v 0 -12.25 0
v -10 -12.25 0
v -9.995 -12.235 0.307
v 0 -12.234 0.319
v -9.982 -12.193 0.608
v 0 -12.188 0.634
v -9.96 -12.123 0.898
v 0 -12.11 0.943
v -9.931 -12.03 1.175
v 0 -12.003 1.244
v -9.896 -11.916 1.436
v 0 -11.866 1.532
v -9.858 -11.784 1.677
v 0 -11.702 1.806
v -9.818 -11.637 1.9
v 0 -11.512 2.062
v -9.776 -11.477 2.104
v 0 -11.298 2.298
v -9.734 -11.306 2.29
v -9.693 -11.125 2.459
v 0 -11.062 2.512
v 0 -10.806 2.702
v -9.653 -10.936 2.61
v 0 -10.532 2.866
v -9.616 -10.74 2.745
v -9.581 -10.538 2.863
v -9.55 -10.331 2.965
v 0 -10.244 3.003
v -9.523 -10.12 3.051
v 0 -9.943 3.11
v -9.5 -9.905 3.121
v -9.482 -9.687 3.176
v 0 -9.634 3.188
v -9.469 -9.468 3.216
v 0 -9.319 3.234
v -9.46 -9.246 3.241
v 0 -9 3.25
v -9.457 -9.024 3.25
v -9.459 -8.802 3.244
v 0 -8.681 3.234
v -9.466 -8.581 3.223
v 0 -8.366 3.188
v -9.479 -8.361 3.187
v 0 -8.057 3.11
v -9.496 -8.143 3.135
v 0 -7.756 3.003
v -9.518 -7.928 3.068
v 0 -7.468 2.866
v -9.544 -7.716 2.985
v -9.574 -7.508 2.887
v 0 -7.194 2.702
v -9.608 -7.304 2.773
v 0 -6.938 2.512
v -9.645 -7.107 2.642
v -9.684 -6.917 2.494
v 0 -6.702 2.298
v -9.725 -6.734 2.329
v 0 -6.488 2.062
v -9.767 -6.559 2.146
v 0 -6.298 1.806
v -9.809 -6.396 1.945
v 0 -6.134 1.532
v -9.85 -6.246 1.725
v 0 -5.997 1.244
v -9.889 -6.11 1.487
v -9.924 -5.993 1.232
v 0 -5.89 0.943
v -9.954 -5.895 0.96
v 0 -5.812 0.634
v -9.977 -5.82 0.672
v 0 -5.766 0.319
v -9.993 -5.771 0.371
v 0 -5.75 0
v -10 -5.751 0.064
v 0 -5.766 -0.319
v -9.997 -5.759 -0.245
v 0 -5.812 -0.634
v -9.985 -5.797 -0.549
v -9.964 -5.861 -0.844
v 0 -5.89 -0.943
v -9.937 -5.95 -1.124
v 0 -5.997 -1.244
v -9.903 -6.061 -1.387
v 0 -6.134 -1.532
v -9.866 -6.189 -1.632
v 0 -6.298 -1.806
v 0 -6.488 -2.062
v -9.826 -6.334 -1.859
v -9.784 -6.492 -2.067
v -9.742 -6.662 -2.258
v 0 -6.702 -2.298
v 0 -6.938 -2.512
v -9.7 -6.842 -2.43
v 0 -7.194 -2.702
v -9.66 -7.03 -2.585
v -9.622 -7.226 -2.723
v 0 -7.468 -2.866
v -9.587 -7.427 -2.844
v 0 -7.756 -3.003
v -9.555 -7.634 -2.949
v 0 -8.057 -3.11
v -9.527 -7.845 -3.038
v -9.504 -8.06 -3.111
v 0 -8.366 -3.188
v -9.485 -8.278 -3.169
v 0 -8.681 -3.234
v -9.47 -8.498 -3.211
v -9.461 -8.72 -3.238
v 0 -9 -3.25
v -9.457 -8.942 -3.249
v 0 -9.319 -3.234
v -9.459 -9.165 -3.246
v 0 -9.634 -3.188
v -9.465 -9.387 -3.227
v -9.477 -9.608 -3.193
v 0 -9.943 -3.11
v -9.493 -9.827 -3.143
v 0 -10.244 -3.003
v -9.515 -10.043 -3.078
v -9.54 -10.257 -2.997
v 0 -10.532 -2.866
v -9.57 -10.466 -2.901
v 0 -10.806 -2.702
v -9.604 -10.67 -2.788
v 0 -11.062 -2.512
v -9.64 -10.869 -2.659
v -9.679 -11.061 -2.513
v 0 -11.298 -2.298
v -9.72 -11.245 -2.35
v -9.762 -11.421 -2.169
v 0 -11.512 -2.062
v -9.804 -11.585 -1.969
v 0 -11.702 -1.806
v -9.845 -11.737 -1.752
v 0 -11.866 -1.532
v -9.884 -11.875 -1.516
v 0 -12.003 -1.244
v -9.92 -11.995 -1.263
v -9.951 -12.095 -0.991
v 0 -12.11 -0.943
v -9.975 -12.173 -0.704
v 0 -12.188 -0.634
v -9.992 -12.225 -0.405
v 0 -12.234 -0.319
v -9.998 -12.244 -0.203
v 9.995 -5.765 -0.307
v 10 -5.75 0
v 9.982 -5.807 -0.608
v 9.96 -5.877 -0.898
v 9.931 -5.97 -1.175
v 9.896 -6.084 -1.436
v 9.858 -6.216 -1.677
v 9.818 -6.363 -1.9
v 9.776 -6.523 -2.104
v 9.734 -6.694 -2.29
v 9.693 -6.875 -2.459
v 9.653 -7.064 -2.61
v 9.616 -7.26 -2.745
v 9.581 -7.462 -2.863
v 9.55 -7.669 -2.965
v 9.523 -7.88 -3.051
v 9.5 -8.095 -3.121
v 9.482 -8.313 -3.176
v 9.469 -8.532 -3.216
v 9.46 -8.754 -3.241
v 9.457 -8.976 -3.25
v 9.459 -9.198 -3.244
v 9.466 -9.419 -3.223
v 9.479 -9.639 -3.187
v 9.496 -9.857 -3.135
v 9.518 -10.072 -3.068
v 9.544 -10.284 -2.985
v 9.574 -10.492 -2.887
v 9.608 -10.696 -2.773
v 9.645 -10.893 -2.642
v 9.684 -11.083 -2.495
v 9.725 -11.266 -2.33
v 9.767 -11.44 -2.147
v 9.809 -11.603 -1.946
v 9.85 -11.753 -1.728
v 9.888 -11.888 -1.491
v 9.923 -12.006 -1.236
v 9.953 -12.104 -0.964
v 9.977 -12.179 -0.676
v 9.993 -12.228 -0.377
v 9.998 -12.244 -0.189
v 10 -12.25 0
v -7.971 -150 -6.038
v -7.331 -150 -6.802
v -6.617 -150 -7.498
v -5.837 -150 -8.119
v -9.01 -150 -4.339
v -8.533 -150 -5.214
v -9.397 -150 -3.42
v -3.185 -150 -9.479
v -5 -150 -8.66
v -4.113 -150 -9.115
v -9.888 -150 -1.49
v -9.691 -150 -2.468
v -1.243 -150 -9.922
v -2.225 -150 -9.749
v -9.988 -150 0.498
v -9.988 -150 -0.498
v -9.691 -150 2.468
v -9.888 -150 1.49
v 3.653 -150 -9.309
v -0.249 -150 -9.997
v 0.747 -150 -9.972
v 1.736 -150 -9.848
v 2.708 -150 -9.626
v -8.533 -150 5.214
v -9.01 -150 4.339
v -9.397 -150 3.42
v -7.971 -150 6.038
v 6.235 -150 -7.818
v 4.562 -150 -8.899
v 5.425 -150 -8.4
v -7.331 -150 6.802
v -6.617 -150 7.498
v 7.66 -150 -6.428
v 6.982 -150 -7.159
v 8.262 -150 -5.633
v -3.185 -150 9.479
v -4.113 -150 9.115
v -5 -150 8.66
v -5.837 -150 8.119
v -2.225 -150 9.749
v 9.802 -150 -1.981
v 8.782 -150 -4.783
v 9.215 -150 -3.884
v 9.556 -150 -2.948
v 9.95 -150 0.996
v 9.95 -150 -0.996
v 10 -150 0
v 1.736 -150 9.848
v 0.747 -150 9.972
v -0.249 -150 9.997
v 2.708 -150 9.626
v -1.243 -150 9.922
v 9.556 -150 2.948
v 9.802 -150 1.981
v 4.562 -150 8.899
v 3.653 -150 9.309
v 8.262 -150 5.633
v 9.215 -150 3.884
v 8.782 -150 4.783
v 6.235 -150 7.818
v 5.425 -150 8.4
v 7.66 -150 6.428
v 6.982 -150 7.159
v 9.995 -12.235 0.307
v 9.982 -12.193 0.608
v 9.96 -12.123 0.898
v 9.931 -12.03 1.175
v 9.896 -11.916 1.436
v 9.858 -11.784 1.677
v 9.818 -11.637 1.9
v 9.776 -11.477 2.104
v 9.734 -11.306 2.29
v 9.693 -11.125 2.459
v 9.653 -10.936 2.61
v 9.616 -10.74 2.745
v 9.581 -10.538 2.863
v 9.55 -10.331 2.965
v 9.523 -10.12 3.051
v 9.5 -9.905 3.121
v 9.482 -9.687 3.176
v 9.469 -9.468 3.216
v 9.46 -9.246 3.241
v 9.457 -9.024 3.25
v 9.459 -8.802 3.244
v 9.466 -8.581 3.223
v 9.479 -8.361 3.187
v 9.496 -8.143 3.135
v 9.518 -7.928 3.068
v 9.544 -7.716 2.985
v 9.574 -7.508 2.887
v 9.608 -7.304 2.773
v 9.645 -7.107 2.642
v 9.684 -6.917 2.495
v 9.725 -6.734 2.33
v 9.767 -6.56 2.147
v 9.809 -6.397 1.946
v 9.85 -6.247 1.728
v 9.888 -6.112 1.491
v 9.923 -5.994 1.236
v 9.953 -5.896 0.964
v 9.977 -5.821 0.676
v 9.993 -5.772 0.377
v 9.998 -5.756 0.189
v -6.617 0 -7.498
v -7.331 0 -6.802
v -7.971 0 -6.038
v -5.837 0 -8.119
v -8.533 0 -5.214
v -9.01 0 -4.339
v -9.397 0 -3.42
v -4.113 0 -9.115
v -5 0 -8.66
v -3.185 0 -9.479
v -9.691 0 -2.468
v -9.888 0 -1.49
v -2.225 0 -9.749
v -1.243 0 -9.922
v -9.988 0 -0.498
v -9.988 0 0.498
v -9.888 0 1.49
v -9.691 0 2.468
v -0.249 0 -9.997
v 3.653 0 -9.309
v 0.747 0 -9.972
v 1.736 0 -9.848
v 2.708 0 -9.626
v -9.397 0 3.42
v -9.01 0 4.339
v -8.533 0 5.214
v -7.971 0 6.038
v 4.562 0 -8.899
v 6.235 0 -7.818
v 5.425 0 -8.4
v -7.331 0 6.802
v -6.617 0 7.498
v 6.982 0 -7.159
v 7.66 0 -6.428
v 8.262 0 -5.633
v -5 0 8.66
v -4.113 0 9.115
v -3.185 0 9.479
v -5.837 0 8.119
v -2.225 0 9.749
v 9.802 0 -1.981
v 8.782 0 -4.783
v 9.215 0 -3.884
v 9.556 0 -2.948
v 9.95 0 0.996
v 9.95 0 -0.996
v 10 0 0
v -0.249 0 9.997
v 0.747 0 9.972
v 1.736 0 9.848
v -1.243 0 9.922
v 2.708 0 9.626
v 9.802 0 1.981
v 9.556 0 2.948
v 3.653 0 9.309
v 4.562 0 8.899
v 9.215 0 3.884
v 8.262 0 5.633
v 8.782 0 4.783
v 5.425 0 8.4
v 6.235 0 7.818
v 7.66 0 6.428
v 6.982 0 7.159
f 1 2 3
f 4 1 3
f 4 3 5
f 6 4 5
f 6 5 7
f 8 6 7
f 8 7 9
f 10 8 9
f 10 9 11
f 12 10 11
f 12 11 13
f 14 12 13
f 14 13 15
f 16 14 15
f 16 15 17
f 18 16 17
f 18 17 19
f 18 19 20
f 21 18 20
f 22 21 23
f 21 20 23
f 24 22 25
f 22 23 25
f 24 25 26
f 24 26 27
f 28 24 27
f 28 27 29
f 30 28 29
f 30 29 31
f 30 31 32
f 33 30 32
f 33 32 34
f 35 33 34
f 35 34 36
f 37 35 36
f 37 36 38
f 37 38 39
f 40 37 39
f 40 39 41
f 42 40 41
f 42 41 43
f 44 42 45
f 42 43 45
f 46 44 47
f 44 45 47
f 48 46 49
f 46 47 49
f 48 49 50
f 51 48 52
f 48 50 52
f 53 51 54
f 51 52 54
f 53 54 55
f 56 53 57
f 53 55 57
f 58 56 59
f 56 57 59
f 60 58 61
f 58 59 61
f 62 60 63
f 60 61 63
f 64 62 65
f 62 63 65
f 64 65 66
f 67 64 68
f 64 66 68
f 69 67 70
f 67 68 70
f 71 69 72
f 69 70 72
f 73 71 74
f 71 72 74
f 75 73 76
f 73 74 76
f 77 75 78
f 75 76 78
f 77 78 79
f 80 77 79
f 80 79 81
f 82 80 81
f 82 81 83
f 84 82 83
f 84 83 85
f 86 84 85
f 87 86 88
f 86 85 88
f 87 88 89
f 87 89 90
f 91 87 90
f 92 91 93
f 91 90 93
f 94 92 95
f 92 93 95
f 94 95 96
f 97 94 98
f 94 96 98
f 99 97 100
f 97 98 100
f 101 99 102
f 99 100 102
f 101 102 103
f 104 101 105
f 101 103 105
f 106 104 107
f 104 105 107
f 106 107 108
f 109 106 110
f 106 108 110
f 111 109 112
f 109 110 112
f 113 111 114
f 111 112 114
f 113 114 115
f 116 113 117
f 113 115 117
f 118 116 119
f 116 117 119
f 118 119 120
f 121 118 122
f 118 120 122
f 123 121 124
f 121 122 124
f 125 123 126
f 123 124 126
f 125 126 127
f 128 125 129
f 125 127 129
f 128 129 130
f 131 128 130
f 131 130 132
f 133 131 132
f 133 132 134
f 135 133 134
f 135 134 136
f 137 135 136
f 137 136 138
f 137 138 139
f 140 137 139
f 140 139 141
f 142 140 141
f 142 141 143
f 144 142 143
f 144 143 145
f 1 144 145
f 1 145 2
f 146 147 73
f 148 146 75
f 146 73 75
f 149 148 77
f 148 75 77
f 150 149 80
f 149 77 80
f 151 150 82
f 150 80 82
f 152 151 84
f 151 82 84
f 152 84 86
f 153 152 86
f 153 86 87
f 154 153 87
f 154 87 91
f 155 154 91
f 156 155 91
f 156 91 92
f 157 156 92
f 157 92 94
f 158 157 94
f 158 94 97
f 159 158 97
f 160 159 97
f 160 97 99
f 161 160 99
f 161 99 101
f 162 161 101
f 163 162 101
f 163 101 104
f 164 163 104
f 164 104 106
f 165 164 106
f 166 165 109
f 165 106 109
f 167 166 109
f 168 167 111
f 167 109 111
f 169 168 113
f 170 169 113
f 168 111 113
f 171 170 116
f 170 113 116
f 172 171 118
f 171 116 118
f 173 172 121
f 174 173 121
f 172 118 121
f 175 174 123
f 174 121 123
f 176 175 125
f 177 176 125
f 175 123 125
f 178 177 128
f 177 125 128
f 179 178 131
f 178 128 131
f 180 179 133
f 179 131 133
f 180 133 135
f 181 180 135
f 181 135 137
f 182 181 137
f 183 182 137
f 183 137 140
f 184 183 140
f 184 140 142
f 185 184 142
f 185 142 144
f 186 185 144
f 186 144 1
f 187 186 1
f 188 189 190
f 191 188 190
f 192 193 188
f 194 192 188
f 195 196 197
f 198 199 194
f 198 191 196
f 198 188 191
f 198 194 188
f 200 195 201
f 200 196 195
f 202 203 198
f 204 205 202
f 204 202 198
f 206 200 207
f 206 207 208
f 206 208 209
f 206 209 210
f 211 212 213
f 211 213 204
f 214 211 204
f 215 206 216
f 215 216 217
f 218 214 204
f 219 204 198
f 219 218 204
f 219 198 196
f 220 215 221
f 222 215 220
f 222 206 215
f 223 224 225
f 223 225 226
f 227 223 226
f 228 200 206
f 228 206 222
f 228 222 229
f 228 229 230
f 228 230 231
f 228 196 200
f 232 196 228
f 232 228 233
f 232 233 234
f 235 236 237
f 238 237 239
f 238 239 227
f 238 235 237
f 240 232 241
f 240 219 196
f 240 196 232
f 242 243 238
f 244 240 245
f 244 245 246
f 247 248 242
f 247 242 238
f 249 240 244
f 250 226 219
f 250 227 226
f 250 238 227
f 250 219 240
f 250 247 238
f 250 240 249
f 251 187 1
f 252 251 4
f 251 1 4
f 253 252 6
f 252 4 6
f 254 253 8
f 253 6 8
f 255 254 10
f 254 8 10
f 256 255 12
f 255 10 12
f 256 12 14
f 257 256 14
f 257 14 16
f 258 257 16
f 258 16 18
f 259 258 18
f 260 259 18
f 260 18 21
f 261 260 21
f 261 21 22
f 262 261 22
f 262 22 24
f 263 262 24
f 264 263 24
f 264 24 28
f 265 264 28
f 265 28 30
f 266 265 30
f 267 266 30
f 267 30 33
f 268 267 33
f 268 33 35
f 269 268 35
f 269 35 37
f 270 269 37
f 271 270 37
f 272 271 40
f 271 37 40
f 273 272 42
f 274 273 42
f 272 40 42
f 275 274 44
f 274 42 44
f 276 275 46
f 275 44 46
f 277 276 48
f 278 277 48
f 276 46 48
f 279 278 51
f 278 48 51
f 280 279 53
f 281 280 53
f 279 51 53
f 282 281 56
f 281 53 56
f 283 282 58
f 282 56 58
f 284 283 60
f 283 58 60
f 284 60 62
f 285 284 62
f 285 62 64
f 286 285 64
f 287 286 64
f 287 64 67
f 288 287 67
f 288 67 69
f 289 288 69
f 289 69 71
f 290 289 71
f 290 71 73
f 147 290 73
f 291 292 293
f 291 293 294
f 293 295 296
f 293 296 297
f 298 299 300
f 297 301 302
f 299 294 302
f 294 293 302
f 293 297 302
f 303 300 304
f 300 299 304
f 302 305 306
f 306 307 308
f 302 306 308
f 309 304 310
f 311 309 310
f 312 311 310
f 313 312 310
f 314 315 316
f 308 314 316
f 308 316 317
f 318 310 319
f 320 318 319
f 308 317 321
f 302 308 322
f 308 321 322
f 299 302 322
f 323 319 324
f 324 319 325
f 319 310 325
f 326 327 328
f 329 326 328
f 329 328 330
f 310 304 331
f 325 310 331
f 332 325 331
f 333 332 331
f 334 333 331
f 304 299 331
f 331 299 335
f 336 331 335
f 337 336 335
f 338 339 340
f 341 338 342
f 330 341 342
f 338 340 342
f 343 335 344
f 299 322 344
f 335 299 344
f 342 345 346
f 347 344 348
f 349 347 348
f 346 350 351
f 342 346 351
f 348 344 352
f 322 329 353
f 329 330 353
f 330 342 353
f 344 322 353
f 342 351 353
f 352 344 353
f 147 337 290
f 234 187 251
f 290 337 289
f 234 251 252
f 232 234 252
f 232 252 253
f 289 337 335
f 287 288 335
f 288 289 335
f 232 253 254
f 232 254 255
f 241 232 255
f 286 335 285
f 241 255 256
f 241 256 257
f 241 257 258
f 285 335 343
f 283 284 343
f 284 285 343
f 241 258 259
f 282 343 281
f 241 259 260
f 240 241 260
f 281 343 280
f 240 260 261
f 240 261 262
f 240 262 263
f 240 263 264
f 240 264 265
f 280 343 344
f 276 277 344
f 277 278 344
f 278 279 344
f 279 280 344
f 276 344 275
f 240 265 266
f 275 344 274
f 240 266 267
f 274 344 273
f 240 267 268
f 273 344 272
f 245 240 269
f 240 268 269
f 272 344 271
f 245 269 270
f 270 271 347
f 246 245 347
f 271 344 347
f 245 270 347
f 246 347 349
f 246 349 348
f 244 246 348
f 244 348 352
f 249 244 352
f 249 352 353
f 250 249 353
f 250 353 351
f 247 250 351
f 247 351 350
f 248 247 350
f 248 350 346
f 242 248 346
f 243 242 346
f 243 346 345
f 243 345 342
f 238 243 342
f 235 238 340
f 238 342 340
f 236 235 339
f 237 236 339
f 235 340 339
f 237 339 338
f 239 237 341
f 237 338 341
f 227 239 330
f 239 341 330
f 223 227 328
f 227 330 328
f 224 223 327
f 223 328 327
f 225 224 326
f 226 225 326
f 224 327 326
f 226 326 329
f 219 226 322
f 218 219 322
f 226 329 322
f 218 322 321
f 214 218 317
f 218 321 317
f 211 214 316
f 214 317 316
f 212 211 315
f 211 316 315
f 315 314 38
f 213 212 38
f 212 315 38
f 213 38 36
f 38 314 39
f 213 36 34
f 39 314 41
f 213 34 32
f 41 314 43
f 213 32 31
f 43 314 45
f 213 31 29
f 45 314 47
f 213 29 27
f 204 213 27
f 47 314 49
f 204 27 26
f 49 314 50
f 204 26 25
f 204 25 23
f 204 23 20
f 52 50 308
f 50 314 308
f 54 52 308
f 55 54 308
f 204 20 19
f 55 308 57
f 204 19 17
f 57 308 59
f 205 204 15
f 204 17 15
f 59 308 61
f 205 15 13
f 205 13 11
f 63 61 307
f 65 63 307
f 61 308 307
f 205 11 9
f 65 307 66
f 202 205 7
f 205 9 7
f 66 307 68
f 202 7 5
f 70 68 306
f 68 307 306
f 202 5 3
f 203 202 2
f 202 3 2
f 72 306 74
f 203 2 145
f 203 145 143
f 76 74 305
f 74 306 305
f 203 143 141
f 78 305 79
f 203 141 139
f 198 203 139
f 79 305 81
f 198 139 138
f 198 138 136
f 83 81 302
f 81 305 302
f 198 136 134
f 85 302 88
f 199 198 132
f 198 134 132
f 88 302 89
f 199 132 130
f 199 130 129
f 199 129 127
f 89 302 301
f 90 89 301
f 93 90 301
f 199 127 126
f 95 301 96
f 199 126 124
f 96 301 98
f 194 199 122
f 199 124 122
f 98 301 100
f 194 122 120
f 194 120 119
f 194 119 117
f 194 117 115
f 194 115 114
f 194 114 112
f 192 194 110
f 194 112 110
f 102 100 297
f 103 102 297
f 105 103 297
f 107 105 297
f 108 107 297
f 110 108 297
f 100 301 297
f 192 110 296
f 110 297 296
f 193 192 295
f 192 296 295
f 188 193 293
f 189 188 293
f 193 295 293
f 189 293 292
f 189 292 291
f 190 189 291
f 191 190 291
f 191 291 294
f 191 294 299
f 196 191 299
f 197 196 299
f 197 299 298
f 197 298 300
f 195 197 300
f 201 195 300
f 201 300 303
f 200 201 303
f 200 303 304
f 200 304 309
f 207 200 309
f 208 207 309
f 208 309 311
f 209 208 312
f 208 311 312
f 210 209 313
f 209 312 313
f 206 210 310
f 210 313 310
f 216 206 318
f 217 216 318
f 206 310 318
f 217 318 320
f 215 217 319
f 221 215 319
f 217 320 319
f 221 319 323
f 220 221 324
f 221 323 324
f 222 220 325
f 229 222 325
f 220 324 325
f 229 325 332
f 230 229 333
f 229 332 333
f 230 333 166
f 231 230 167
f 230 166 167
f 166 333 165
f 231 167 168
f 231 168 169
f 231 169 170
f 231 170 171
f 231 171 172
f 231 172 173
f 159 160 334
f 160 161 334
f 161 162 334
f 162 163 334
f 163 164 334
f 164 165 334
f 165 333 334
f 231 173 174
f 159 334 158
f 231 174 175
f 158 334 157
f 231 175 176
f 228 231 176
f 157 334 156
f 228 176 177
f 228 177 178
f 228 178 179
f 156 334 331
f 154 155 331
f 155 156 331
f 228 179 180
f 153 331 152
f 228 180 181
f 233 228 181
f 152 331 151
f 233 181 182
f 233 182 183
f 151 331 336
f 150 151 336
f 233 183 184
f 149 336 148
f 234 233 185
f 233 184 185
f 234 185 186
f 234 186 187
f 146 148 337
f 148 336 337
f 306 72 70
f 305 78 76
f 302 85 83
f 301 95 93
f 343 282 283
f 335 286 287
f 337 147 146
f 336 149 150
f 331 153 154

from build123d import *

# Parameters (mm, degrees)
F0_R     = 10
F1_DEPTH = 150
F4_D     = 6.5
F4_DEPTH = 10.001
F5_D     = 6.5


# Not quite as in the source:
# - a feature names something its author has since deleted; it is built from what else it names


with BuildPart() as f1:
    # F0 (on Front) → F1 (new body)
    with BuildSketch(Plane.XZ):
        Circle(F0_R)
    extrude(amount=F1_DEPTH)

    # F4 (through all, one way)
    with BuildSketch(Plane(origin=(0, 0, 0), x_dir=(0, 1, 0), z_dir=(-1, 0, 0))):
        with Locations((-9, 0)):
            Circle(F4_D / 2)
    extrude(amount=-F4_DEPTH, mode=Mode.SUBTRACT)

    # F5 (through all)
    with Locations(Plane.YZ):
        with Locations((-9, 0)):
            Hole(F5_D / 2)


solid = f1.part
